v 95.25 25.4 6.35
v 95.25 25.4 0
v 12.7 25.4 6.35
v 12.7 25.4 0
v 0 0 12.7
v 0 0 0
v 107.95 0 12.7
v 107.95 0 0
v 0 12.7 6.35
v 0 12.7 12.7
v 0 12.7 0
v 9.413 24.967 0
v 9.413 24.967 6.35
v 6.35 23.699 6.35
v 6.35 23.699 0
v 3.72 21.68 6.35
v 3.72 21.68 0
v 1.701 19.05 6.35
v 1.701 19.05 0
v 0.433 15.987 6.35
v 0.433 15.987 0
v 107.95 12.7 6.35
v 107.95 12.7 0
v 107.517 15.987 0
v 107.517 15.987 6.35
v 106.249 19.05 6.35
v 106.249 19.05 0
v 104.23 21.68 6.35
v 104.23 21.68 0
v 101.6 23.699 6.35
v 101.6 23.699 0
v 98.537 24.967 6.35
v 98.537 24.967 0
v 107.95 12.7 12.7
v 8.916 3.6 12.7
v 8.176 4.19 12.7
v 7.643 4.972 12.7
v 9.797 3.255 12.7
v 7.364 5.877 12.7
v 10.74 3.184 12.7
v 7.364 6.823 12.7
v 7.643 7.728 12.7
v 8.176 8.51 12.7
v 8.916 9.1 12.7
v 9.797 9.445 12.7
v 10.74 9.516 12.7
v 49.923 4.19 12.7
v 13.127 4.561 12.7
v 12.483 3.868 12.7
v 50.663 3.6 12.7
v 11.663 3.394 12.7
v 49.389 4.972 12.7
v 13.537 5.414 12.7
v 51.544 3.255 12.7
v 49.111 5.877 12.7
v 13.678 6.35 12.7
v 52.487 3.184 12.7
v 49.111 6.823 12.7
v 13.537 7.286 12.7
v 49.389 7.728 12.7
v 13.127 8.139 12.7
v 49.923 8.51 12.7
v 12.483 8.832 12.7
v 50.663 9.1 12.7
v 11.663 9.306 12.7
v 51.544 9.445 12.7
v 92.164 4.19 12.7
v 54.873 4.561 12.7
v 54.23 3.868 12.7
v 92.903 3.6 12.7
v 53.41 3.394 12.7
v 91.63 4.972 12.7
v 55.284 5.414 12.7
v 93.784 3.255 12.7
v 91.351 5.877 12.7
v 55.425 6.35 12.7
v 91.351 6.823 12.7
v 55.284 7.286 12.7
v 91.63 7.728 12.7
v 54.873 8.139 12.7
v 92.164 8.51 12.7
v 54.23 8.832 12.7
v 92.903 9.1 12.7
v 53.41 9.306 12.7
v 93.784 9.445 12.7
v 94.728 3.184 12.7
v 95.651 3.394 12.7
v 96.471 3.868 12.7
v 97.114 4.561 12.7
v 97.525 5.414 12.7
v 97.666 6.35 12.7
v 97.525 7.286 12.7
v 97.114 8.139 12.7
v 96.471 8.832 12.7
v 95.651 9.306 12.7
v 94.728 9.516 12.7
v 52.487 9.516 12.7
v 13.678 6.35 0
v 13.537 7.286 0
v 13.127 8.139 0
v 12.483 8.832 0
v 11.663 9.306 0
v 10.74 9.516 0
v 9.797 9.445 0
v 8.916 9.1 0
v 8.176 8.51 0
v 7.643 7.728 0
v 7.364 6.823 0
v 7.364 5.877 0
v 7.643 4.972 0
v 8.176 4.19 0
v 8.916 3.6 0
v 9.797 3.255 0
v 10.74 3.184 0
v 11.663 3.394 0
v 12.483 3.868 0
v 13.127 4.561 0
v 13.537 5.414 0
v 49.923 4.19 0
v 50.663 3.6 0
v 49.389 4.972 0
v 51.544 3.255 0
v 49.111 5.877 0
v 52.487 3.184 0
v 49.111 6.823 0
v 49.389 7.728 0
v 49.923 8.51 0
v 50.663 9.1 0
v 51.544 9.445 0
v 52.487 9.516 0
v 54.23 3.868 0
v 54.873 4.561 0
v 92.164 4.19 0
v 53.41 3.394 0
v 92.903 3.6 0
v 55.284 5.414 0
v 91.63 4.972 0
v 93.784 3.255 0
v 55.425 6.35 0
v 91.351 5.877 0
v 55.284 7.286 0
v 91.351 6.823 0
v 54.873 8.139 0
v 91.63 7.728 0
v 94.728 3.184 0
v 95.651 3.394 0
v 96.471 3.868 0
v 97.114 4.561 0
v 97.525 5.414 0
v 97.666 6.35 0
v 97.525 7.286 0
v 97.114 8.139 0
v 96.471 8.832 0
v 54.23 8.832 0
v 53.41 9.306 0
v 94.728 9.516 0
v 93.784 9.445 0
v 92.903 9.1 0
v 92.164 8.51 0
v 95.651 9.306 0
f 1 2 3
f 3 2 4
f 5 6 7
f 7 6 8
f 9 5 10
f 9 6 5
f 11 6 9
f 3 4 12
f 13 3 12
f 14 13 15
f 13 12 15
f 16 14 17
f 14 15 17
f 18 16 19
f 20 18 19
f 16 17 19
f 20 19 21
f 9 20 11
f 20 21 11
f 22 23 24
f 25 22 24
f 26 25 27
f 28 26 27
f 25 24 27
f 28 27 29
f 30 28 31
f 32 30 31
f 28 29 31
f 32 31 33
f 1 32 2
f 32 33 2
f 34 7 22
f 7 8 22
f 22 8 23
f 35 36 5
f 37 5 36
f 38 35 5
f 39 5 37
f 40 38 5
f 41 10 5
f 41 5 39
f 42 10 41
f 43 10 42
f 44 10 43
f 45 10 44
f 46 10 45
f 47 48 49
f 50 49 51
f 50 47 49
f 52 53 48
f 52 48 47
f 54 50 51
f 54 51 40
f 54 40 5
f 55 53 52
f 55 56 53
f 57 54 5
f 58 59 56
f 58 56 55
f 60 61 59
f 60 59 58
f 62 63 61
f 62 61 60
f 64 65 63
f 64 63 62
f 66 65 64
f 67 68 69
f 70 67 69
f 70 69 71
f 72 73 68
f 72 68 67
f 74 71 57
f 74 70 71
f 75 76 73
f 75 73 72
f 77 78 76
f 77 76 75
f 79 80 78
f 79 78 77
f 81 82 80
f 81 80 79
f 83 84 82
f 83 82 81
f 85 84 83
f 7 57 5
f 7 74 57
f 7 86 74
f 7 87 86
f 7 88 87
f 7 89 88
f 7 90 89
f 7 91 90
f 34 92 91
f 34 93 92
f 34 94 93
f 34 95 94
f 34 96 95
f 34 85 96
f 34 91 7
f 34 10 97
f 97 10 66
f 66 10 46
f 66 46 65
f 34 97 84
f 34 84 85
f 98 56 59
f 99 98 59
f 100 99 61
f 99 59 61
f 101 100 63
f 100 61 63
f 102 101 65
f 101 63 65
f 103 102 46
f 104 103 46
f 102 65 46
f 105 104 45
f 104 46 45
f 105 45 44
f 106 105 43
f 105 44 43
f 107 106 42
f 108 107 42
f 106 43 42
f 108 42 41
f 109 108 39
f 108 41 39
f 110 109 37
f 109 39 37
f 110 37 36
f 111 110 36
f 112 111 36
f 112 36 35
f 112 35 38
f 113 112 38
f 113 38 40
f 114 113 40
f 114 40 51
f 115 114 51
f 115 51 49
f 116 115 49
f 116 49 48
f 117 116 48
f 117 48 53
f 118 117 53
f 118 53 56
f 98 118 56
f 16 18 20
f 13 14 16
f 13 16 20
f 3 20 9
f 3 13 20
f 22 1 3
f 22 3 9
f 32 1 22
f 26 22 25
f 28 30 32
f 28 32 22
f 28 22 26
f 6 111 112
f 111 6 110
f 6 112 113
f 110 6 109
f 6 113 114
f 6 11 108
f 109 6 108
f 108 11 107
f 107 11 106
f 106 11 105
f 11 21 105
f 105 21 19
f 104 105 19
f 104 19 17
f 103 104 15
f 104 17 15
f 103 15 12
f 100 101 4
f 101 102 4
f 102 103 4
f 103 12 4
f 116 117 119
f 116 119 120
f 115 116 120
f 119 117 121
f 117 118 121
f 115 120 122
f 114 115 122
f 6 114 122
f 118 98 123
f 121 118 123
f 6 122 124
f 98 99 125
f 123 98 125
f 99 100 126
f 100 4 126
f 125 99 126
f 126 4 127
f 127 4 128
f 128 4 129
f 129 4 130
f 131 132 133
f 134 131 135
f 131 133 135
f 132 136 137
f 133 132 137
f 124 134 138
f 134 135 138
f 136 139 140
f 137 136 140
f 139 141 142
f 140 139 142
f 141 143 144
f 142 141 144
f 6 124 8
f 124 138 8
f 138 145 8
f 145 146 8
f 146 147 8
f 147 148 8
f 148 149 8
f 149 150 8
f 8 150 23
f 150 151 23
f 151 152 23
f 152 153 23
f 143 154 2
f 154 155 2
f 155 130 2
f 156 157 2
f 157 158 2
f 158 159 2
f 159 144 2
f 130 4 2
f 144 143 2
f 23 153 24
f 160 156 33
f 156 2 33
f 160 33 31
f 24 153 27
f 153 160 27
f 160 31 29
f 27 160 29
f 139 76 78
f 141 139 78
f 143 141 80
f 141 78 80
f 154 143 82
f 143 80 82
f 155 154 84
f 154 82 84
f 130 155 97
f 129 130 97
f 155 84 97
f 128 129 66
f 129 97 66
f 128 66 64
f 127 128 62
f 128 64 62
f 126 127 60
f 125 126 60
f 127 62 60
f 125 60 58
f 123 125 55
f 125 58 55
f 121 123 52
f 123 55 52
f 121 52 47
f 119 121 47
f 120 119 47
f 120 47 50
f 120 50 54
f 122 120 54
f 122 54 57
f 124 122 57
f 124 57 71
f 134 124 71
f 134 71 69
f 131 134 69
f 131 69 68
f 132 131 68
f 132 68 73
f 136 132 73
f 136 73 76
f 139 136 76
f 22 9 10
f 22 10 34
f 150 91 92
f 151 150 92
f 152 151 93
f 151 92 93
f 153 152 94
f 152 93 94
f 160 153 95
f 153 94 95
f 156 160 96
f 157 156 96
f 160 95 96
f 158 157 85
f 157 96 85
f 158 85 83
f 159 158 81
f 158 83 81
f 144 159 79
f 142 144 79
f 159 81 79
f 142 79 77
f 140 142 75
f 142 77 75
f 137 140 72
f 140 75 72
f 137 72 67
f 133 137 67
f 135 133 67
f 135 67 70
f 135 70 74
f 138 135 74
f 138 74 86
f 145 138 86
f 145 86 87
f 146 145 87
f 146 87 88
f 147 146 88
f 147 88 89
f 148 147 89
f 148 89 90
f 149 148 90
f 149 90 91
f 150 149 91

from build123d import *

# Parameters (mm, degrees)
F1_DEPTH = 6.35
F2_W     = 107.95
F2_H     = 12.7
F3_DEPTH = 6.35
F4_R     = 3.175
F5_DEPTH = 25.4


with BuildPart() as f1:
    # F0 (on Top) → F1 (new body)
    with BuildSketch(Plane.XY):
        with BuildLine():
            Line((0, 12.7), (0, 0))
            Line((0, 0), (107.95, 0))
            Line((107.95, 0), (107.95, 12.7))
            ThreePointArc((107.95, 12.7), (104.230256, 21.680256), (95.25, 25.4))
            Line((95.25, 25.4), (12.7, 25.4))
            ThreePointArc((12.7, 25.4), (3.719744, 21.680256), (0, 12.7))
        make_face()
    extrude(amount=F1_DEPTH)

    # F2 (on face) → F3 (join)
    with BuildSketch(Plane.XY.offset(6.35)):
        with Locations((53.975, 6.35)):
            Rectangle(F2_W, F2_H)
    extrude(amount=F3_DEPTH)

    # F4 (on face) → F5 (cut)
    with BuildSketch(Plane.XY.offset(12.7)):
        with Locations((10.503207, 6.35)):
            Circle(F4_R)
        with Locations((52.250076, 6.35)):
            Circle(F4_R)
        with Locations((94.490955, 6.35)):
            Circle(F4_R)
    extrude(amount=-F5_DEPTH, mode=Mode.SUBTRACT)


solid = f1.part
